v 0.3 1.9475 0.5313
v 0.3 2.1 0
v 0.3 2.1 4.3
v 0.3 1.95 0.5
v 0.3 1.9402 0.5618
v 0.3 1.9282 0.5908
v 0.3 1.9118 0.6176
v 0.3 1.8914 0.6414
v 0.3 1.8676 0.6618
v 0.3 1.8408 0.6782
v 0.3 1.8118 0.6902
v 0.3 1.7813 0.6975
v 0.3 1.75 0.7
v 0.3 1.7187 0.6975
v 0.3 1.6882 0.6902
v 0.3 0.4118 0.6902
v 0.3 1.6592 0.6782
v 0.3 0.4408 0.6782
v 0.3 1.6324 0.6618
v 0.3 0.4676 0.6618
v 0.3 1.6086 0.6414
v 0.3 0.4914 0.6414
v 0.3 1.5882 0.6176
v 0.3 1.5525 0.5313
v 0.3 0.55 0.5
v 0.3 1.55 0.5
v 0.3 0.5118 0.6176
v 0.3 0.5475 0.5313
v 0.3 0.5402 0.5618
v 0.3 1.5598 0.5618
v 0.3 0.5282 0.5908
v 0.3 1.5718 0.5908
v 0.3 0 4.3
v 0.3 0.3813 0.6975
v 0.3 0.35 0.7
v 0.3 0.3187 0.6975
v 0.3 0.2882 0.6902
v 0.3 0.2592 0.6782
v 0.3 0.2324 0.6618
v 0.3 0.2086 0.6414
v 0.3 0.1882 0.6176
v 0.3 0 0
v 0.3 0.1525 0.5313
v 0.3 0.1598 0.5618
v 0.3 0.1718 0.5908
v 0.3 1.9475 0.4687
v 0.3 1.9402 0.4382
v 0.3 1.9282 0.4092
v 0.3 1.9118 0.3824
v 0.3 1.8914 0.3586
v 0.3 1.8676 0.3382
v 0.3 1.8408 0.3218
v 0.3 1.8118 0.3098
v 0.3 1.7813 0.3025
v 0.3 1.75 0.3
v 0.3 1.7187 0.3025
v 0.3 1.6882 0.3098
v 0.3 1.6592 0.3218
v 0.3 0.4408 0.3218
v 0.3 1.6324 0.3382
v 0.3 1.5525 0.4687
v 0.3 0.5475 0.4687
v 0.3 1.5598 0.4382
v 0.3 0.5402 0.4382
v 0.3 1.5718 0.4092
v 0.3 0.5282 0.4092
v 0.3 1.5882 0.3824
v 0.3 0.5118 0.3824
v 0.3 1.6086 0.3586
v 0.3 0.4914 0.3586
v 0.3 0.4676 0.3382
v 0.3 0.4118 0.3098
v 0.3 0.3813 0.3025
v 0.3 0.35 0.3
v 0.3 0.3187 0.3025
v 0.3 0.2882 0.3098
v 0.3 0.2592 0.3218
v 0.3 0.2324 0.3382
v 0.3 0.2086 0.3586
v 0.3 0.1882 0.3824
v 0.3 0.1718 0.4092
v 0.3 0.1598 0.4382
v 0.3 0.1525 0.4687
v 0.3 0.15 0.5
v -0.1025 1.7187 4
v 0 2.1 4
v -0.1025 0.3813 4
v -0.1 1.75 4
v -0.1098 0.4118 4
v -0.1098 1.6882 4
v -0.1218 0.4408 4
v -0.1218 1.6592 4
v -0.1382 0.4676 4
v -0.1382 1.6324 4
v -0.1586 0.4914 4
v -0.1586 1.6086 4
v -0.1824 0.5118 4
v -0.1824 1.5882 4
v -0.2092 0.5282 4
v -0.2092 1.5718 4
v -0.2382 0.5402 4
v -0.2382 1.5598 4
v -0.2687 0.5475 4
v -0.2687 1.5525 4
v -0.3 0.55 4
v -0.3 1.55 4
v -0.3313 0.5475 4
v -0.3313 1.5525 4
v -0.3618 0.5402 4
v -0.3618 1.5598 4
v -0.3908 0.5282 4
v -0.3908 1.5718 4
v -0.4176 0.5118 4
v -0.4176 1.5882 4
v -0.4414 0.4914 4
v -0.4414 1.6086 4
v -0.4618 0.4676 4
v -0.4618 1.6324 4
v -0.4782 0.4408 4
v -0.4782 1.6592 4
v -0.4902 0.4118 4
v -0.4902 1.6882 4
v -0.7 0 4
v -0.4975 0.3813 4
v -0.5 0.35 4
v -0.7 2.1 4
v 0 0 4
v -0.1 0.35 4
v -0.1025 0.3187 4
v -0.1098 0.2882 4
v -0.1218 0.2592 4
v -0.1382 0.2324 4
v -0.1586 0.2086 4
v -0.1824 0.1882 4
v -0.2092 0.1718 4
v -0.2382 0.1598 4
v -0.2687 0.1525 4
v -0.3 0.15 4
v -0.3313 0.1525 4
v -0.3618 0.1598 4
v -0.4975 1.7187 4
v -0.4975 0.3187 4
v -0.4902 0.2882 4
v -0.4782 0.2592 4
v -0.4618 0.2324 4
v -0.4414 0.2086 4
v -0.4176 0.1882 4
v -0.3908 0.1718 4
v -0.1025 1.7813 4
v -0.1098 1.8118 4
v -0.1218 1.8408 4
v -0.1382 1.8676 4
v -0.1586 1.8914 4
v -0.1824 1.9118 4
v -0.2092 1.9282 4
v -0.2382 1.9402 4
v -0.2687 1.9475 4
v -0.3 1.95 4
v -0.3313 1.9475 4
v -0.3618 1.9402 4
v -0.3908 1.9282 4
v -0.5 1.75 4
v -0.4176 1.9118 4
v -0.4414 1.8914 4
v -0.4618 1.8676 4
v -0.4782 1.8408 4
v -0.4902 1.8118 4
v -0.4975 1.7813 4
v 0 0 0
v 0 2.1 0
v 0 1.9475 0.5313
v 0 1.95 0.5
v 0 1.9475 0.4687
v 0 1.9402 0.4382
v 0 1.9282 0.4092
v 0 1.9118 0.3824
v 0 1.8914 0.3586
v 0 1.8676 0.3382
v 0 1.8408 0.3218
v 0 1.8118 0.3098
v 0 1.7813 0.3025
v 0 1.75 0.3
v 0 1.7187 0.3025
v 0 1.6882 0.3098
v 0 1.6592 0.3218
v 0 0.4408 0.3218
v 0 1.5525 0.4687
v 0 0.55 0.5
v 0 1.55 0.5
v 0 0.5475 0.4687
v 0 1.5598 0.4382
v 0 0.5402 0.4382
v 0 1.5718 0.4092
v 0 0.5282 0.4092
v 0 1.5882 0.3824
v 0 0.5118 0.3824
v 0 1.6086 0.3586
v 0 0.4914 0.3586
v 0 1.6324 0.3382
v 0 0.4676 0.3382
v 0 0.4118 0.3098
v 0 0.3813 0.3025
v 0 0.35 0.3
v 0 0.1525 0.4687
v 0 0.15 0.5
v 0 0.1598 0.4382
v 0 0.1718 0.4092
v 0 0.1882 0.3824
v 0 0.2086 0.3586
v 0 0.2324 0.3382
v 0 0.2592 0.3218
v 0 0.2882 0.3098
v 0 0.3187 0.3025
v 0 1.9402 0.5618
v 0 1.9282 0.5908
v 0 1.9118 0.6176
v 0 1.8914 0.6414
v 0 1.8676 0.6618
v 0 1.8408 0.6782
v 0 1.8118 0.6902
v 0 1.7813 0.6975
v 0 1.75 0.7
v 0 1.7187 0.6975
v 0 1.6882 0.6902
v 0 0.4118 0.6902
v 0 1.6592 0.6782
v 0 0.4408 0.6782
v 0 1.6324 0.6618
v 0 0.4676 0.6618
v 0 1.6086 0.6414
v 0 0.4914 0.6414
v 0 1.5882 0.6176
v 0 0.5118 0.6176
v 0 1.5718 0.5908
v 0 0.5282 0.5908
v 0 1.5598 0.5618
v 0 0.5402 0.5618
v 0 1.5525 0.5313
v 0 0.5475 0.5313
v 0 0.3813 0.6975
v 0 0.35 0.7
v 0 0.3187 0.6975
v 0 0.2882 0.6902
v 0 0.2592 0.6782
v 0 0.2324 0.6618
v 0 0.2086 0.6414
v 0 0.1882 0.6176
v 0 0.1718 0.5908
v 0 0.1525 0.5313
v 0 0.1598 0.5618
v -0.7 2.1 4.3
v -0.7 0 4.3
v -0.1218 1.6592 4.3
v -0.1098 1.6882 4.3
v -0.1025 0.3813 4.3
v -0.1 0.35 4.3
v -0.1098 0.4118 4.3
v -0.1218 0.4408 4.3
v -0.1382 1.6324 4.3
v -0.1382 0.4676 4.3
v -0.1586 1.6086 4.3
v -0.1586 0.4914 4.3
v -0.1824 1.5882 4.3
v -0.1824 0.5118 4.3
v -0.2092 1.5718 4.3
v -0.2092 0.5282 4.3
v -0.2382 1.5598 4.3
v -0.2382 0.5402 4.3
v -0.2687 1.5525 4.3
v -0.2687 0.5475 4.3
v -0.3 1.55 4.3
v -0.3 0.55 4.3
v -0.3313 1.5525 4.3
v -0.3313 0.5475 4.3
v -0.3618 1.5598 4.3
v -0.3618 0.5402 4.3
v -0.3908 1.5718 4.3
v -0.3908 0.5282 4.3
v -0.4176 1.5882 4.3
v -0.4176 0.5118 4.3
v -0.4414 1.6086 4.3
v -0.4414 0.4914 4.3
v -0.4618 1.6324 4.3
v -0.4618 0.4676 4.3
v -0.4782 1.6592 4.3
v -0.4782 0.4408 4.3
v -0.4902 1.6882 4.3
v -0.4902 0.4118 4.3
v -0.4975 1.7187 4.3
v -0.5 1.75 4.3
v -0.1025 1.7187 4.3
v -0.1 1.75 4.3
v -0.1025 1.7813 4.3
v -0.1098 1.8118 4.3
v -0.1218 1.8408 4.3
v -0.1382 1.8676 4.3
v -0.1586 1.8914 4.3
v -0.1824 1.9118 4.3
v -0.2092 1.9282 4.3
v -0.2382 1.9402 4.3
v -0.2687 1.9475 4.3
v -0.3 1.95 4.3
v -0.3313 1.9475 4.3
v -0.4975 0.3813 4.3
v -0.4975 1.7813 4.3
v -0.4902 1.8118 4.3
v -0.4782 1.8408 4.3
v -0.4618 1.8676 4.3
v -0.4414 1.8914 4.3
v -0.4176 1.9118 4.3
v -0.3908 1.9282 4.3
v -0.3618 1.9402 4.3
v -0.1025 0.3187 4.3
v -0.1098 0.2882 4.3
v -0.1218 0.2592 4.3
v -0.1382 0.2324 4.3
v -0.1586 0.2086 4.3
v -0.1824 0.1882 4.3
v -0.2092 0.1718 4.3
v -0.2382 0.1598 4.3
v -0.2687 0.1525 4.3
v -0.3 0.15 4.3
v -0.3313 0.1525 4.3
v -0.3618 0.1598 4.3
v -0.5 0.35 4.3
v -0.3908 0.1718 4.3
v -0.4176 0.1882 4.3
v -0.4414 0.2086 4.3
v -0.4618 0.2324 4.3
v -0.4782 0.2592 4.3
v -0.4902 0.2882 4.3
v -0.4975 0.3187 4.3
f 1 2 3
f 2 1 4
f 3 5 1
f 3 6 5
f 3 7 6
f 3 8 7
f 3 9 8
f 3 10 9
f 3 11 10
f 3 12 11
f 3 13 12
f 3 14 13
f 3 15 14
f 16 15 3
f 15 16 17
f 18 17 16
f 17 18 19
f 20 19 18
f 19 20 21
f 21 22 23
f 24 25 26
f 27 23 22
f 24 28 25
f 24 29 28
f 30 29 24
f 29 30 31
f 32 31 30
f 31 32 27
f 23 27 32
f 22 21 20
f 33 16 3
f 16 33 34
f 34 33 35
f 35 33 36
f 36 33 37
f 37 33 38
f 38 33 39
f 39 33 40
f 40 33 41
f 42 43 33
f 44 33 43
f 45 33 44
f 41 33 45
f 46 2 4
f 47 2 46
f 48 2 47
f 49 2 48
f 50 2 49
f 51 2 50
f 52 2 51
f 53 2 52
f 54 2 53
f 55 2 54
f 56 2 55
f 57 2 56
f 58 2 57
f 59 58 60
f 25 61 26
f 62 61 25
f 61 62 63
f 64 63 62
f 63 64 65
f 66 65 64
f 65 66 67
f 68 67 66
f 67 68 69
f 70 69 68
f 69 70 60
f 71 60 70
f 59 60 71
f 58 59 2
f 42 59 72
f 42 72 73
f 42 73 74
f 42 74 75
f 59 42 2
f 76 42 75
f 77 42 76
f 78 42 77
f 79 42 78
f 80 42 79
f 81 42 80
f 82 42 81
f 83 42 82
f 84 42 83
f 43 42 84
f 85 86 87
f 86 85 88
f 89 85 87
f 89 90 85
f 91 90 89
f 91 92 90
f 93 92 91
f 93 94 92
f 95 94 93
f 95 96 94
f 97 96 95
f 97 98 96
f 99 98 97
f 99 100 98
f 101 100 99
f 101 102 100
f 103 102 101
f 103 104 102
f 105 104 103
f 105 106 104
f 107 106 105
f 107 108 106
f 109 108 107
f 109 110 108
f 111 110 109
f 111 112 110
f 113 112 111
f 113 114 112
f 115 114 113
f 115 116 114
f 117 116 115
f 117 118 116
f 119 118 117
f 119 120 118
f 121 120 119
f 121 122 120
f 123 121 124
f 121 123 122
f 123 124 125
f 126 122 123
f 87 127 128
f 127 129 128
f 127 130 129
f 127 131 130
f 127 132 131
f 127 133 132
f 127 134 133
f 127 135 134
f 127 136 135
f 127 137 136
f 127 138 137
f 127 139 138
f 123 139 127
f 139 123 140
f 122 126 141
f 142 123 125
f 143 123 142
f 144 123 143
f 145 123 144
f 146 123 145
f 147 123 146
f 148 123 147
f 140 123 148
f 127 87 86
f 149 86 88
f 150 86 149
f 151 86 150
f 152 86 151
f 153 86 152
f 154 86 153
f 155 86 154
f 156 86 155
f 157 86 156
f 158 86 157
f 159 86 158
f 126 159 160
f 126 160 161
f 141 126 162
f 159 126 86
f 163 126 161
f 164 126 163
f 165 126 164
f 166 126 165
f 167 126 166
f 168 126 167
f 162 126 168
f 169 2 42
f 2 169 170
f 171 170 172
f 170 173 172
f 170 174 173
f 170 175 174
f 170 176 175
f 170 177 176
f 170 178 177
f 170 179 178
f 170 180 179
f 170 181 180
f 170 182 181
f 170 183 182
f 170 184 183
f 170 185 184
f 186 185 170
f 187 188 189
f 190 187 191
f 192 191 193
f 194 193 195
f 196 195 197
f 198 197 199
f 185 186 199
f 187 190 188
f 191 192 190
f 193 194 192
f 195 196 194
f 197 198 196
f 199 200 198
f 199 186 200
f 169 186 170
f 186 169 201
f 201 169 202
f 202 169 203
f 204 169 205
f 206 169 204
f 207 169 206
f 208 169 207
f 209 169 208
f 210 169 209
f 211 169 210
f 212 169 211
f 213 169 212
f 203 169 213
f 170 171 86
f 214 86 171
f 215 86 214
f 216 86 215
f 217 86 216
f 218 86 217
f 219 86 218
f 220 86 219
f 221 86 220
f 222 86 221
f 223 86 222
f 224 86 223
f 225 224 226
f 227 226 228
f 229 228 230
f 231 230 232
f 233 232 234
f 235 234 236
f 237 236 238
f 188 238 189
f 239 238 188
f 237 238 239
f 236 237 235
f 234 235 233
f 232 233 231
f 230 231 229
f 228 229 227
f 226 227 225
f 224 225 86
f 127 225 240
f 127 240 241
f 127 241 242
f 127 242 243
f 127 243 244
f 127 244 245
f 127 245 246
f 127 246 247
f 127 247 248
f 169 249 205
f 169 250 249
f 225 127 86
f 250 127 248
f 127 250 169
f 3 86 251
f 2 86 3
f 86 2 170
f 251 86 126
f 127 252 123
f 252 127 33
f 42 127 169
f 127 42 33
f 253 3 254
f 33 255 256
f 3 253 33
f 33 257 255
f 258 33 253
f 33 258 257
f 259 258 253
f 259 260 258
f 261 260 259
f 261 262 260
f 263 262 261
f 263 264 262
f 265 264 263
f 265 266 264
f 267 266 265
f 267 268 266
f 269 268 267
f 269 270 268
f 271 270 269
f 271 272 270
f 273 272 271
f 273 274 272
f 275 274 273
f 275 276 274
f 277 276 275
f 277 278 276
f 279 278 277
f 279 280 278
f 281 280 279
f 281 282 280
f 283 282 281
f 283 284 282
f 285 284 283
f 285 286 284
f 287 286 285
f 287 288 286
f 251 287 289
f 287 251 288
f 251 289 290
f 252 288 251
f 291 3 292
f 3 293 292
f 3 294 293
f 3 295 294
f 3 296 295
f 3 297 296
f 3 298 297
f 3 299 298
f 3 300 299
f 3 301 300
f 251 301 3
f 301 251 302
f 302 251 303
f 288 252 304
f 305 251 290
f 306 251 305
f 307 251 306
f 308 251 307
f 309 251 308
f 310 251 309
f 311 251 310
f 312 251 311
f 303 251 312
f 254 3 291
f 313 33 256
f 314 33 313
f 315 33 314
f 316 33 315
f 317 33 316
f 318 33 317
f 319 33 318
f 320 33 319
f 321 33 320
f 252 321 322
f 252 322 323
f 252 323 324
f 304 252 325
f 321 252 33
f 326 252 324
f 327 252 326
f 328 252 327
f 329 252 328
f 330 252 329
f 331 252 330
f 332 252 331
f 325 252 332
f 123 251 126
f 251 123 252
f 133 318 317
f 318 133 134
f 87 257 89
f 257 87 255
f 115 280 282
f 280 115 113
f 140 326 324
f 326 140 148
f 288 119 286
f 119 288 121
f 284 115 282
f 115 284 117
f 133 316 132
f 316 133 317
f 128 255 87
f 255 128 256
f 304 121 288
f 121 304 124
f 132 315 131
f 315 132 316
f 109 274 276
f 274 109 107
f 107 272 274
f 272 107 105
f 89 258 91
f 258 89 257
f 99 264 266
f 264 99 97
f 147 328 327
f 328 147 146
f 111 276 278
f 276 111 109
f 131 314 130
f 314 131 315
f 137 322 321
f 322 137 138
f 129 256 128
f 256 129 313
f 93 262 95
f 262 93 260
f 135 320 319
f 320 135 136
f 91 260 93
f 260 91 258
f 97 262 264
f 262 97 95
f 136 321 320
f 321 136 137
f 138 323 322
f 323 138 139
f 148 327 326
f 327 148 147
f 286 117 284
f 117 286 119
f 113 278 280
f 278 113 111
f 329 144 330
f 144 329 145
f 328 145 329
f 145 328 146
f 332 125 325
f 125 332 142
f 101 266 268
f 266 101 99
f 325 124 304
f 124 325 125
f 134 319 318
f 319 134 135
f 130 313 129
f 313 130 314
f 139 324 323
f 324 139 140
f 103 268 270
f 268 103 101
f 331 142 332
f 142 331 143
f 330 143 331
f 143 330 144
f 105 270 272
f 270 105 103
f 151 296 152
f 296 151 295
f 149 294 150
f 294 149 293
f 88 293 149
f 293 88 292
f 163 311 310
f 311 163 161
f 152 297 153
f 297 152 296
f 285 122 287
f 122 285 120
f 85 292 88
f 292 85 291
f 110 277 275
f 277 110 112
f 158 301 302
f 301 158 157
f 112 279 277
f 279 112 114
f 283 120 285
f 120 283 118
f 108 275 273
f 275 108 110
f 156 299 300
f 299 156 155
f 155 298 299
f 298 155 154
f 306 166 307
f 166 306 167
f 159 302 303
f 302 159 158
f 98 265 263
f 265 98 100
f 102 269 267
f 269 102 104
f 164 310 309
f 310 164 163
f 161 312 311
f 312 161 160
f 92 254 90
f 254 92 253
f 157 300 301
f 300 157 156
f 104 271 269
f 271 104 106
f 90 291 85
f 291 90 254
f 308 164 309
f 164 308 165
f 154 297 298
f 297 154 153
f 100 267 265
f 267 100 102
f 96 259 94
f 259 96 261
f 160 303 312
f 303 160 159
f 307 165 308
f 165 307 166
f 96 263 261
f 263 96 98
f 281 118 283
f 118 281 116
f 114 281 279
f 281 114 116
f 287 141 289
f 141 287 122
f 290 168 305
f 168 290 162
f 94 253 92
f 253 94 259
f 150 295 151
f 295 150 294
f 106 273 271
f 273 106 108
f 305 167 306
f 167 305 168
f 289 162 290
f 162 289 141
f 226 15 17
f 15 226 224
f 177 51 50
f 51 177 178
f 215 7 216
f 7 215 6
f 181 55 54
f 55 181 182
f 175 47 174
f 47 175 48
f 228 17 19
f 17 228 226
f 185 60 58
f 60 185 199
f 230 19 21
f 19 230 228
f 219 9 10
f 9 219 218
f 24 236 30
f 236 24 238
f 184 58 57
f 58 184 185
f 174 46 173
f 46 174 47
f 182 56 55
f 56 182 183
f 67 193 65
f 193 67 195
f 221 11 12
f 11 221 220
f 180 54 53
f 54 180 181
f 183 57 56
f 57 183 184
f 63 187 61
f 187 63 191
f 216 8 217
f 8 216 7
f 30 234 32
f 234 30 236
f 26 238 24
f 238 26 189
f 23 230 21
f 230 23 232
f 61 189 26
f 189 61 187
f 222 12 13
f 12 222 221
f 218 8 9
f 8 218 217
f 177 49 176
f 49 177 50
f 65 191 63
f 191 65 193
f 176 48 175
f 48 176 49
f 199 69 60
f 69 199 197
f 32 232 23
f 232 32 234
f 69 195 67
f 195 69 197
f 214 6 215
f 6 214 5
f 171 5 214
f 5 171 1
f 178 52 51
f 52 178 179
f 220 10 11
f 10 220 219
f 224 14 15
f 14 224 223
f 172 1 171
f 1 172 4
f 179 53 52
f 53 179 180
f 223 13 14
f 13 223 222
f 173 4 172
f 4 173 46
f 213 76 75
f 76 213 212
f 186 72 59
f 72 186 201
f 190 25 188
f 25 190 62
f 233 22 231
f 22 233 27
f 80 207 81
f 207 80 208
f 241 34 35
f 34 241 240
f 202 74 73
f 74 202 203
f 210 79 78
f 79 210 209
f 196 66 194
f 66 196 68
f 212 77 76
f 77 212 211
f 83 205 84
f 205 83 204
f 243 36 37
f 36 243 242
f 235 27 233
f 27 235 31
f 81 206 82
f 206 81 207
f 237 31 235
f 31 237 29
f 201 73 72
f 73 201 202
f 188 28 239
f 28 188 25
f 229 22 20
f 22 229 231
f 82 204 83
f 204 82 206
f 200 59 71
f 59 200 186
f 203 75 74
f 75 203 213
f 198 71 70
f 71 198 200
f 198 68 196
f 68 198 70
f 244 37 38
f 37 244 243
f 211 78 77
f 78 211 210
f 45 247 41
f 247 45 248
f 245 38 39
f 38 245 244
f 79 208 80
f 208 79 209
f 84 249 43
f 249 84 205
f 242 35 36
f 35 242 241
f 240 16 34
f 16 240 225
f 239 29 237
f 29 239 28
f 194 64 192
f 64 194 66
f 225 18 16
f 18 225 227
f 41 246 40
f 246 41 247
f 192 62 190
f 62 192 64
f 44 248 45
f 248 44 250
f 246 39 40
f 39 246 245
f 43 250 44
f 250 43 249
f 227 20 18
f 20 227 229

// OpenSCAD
$fn = 40;
difference() {
  union() {
    cube([0.3,2.1, 4]);
    translate([-0.7,0,4]) cube([1, 2.1, 0.3]);
  }

  // Top holes
  translate([-.3, 2.1/2 - 0.7, 4]) cylinder(1, 0.2, 0.2, center=true);
  translate([-.3, 2.1/2 + 0.7, 4]) cylinder(1, 0.2, 0.2, center=true);

  // Bottom holes
  translate([-0.5,2.1/2 + 0.7,0.5]) rotate([0,90,0]) cylinder(1, 0.2, 0.2);
  translate([-0.5,2.1/2 - 0.7,0.5]) rotate([0,90,0]) cylinder(1, 0.2, 0.2);

}
